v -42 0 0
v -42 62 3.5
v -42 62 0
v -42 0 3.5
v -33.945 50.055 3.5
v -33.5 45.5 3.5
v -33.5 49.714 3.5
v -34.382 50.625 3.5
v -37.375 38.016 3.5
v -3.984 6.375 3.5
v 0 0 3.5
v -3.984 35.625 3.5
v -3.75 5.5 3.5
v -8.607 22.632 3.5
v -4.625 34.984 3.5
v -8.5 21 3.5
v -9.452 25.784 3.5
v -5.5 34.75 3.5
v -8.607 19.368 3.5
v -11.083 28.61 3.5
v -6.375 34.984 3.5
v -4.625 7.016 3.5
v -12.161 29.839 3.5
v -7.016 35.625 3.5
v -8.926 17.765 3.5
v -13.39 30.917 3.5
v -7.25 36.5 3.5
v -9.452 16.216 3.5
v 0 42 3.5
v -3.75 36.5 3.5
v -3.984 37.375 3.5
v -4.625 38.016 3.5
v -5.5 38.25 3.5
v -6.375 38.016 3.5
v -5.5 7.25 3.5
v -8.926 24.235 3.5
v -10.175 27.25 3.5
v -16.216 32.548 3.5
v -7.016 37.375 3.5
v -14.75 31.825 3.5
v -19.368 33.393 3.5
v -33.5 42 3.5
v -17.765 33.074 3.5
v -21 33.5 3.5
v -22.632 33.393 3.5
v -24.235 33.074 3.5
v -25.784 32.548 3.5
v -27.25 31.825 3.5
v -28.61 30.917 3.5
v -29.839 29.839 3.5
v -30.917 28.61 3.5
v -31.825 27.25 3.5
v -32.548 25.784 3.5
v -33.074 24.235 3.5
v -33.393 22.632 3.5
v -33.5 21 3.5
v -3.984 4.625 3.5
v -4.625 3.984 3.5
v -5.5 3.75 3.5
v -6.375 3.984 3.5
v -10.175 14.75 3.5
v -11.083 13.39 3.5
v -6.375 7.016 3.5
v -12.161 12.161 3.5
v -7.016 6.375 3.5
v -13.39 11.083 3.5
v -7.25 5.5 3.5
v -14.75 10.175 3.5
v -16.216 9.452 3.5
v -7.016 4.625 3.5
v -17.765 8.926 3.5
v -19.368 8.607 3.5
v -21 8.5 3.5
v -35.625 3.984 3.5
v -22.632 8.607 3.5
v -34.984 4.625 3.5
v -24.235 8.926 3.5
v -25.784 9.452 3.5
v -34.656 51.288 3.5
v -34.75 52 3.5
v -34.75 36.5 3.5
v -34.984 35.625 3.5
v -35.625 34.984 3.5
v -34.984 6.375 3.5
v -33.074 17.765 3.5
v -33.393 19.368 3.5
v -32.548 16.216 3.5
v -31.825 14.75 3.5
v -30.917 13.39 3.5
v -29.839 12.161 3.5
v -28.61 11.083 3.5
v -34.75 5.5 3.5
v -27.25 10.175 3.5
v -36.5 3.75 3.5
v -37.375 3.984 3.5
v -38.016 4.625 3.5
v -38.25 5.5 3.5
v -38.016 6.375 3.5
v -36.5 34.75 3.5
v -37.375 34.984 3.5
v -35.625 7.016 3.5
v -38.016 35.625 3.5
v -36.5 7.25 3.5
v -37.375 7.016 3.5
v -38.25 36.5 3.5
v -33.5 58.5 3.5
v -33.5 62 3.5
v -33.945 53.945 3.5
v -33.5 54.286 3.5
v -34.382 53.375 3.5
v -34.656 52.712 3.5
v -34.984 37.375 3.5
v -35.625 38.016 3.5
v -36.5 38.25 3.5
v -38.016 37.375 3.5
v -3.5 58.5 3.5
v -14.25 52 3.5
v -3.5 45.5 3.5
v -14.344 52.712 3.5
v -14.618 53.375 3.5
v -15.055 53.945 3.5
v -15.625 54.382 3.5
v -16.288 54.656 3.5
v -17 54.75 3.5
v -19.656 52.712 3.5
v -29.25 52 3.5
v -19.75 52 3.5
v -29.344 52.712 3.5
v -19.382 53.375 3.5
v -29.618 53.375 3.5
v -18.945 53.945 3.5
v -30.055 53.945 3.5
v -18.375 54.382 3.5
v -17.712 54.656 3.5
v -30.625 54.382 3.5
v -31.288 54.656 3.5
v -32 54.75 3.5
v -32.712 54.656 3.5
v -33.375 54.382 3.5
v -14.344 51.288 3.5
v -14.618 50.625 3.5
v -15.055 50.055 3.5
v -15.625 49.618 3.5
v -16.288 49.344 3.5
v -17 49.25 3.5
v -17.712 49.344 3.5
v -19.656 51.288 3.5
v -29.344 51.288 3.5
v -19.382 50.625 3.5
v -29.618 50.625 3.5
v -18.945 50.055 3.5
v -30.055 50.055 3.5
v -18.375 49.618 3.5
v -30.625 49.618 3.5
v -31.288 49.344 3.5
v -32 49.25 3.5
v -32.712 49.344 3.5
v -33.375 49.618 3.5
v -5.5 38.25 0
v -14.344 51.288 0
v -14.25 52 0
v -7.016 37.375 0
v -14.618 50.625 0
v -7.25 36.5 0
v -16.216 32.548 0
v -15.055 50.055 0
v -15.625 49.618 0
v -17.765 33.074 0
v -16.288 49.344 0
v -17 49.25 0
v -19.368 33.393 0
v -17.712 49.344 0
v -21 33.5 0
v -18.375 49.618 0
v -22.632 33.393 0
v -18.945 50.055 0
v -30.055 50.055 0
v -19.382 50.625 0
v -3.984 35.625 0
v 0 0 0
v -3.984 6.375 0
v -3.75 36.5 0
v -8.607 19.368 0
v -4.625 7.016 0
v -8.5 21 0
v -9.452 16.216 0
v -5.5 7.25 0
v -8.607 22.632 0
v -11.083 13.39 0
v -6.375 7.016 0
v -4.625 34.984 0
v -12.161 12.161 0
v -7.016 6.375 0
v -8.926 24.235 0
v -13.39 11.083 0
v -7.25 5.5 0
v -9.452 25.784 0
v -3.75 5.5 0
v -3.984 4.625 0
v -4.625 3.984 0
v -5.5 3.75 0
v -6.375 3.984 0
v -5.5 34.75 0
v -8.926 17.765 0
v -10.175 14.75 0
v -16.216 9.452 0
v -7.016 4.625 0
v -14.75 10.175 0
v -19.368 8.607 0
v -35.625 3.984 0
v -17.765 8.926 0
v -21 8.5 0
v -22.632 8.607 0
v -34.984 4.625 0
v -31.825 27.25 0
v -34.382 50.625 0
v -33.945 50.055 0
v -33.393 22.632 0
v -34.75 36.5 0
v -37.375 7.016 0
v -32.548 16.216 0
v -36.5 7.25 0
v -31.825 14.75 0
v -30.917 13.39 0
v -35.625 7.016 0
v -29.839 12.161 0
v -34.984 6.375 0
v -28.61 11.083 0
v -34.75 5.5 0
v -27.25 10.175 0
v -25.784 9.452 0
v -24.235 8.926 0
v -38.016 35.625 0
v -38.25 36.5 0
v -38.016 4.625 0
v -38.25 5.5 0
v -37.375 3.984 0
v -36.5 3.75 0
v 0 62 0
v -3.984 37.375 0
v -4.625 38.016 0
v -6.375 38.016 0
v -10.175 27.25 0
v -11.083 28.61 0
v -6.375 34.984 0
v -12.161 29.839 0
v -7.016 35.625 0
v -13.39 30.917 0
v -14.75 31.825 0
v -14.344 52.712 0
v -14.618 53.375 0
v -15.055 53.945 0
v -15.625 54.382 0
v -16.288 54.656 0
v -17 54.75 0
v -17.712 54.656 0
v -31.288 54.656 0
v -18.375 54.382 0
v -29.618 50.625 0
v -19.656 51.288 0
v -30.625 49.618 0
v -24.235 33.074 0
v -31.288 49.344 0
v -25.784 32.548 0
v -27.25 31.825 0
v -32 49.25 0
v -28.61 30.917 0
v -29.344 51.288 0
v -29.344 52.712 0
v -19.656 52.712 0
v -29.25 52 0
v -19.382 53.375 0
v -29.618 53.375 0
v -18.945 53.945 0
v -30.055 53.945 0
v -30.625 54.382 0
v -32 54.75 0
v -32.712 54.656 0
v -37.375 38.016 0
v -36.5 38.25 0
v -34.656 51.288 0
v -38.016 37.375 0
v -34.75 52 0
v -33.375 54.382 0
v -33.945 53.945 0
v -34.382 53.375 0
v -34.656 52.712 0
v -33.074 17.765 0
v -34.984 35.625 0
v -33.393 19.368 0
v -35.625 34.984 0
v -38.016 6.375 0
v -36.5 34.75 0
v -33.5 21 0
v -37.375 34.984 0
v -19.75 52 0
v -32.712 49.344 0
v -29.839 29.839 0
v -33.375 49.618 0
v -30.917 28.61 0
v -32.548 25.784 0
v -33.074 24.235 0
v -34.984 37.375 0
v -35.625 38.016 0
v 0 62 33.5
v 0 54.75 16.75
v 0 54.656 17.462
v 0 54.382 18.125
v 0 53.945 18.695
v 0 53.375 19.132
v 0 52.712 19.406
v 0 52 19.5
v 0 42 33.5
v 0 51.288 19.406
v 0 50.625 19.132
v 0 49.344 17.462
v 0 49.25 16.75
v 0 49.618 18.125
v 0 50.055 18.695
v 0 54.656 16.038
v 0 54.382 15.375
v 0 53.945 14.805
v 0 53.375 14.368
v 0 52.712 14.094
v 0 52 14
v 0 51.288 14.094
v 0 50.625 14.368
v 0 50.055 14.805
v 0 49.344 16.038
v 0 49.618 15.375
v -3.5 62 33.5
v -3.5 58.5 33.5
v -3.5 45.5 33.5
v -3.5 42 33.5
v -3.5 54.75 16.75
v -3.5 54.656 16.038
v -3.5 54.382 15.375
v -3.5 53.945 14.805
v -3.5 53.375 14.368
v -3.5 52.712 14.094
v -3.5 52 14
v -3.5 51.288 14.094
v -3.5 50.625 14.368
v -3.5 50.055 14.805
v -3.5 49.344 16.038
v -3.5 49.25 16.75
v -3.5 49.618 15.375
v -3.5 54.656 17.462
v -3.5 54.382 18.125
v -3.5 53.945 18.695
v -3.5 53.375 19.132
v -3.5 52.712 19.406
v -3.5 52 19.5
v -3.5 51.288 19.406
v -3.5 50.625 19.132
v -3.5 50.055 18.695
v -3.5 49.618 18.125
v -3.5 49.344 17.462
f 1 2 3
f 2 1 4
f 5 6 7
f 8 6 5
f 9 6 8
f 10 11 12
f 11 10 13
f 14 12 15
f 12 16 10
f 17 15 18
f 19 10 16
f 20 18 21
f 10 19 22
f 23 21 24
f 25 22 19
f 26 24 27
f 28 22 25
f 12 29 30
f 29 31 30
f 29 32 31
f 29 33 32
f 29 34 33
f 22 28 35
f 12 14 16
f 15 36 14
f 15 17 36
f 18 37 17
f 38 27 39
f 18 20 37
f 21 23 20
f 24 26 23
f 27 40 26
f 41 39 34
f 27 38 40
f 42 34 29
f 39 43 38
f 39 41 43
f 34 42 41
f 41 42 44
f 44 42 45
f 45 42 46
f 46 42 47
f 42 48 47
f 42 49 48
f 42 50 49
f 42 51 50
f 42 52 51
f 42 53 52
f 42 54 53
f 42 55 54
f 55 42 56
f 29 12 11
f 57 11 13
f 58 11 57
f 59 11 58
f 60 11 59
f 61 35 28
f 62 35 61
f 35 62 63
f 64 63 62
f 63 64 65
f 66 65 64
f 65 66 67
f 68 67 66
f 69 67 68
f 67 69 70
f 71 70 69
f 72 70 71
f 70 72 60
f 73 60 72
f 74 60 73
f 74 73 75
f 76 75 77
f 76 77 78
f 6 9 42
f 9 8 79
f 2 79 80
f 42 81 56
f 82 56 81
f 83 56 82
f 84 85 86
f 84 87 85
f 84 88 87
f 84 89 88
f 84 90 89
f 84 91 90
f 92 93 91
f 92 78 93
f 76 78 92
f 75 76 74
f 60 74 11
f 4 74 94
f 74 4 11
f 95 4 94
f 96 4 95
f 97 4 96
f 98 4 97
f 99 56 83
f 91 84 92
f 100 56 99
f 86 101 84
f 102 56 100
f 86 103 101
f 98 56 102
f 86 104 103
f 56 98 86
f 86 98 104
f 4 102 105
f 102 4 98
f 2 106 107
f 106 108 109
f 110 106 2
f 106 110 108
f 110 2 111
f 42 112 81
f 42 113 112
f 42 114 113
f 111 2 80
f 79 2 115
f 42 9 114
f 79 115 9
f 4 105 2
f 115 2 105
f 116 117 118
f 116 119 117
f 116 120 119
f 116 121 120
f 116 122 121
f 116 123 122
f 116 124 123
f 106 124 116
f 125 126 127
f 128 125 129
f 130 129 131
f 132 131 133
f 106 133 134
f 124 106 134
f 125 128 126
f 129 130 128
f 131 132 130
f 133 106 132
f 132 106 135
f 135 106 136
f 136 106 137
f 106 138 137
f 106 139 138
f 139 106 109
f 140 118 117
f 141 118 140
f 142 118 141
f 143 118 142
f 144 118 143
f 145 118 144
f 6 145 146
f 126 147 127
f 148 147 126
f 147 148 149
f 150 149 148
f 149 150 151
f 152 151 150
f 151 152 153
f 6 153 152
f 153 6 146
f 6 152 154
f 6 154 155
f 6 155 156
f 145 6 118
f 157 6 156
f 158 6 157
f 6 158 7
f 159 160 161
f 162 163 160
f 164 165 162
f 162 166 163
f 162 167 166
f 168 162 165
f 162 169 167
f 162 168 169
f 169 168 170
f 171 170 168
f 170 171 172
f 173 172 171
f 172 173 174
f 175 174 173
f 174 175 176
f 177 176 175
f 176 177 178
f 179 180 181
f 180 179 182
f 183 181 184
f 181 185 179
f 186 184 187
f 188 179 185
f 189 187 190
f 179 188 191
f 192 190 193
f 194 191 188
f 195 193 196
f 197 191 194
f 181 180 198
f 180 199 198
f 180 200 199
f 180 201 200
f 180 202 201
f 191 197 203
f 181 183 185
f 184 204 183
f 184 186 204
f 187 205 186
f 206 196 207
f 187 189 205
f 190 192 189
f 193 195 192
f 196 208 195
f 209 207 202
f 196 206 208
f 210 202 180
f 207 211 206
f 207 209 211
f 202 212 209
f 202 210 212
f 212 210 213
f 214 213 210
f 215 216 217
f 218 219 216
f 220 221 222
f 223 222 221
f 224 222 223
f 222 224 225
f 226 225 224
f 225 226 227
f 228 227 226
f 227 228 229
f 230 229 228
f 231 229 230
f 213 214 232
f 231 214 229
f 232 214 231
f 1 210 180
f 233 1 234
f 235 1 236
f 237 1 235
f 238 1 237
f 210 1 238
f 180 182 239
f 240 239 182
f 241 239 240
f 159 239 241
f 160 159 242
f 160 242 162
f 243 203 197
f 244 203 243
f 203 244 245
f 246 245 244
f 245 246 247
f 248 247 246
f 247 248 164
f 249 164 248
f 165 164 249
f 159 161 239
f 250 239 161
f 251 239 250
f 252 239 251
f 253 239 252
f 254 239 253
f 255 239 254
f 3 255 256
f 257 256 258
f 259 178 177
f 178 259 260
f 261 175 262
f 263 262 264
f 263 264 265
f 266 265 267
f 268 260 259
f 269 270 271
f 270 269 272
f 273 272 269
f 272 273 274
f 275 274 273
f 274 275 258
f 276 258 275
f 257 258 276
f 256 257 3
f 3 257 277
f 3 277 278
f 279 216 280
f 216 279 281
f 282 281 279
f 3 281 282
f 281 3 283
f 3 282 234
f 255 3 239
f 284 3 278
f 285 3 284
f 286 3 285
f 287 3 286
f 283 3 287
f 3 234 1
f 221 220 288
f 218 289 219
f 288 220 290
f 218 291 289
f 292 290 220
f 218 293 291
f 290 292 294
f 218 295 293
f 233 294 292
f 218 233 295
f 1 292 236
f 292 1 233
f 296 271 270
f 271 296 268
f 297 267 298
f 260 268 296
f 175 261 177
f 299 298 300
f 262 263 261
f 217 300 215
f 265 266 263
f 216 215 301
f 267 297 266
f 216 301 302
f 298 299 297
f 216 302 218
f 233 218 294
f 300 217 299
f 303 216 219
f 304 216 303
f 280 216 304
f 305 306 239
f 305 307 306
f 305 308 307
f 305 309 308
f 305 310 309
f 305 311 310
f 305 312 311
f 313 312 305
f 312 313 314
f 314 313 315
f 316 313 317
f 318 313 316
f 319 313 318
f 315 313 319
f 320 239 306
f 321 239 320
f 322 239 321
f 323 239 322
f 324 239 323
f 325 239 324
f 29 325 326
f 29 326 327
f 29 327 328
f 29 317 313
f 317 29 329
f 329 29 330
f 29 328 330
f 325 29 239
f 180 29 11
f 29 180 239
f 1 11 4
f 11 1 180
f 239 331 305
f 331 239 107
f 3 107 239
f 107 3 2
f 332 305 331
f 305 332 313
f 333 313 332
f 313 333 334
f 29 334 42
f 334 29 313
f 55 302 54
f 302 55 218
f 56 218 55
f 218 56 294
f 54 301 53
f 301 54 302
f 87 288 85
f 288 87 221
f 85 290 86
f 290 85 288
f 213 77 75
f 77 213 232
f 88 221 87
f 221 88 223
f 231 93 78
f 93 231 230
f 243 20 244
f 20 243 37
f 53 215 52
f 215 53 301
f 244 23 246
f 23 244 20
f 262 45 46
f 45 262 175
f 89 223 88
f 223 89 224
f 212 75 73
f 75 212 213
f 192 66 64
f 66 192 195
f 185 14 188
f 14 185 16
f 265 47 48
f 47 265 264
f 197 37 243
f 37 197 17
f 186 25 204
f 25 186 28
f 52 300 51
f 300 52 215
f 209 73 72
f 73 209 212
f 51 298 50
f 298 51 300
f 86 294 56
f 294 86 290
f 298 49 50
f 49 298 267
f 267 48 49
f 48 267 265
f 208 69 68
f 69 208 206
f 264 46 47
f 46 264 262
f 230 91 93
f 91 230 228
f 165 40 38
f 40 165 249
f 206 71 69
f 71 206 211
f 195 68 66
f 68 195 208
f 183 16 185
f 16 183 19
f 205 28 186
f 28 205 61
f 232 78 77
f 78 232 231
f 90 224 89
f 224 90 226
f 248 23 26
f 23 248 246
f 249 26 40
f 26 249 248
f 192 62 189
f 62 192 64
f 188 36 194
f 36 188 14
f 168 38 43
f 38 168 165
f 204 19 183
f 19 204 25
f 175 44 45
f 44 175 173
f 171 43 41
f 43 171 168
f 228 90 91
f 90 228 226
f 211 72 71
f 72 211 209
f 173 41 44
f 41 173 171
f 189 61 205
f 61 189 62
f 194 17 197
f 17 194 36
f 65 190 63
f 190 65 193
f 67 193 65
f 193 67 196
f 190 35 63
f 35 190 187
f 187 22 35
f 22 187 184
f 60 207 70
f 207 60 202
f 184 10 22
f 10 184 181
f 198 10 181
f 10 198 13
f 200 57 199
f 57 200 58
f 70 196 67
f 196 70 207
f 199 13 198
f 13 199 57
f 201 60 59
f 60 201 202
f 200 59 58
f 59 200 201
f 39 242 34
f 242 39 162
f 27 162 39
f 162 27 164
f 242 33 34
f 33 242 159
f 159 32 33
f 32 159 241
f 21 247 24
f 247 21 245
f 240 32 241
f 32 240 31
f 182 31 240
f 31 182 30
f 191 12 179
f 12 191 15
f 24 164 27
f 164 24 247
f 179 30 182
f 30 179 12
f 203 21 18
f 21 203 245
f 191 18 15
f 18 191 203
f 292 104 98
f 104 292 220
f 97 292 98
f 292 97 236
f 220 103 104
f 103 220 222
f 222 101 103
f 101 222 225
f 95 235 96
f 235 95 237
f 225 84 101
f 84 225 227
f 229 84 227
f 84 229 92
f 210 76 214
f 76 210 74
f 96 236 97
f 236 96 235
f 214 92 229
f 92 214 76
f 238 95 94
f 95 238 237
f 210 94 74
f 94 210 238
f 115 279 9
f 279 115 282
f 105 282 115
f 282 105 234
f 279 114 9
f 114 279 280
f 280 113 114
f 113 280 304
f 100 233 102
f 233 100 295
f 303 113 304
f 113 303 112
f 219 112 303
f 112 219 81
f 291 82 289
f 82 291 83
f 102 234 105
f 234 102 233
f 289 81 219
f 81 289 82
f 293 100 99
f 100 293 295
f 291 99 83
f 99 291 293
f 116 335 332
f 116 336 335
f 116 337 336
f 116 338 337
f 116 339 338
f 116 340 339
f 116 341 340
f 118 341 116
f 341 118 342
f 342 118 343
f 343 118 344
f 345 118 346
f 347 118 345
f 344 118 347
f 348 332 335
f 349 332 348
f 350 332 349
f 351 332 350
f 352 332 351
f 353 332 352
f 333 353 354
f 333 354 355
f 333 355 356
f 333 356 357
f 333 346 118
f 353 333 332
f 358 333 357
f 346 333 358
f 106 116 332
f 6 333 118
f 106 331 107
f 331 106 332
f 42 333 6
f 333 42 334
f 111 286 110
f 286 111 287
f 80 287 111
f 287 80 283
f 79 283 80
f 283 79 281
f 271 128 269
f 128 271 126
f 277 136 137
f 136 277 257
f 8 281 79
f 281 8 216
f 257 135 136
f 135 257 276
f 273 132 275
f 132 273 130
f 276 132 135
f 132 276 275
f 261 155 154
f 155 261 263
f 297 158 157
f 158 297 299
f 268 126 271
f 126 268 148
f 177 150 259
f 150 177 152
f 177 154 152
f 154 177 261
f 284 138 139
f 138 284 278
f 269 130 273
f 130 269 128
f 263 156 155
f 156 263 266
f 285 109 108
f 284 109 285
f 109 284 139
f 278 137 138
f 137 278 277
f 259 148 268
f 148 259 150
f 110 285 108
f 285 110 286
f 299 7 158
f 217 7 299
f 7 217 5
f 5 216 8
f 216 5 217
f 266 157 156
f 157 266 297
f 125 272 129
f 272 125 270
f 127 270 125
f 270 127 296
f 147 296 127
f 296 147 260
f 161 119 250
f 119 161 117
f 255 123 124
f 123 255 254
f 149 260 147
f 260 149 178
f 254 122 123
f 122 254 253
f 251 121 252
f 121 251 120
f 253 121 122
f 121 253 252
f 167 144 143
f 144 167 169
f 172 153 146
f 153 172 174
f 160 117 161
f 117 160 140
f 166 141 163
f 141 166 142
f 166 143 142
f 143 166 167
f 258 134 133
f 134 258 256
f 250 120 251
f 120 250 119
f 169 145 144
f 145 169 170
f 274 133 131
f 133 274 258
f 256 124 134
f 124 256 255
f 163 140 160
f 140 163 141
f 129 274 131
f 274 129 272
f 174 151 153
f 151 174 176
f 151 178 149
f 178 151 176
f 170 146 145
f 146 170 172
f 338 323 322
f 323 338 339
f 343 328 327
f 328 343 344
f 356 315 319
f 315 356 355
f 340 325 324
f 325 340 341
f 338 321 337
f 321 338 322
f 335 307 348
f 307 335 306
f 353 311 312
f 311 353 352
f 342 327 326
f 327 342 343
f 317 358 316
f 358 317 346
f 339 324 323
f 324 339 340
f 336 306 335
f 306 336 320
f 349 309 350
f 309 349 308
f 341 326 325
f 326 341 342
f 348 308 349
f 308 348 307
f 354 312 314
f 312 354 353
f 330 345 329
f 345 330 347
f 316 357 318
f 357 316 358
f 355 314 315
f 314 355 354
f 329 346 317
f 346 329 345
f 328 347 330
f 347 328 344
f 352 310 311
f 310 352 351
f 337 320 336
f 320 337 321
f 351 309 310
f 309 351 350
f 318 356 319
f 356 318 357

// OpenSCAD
t=3.5;
mirror([1,0,0])
difference()
{
    union()
    {
        cube([42,42,t]);
        
        //translate([-20,0,0])
        //    cube([20,42,t]);
        translate([0,42,0])
            cube([42,20,t]);
        
        //translate([-20,0,t])
        //    cube([20,42,40]);
        translate([0,42,t])
            cube([33.5,20,30]);
    }
    
    union()
    {
        translate([21,21,0])
            cylinder(d=25,h=t,$fn=48);
        
        translate([21-31/2,21-31/2,0])
            cylinder(d=3.5,h=t,$fn=12);
        translate([21-31/2,21+31/2,0])
            cylinder(d=3.5,h=t,$fn=12);
        translate([21+31/2,21-31/2,0])
            cylinder(d=3.5,h=t,$fn=12);
        translate([21+31/2,21+31/2,0])
            cylinder(d=3.5,h=t,$fn=12);
        
        translate([-20+t,0,t])
            cube([20-t*2,42-t,40]);
        translate([0+t,42+t,t])
            cube([33.5-t,20-t*2,30]);
        
        translate([-20,0,t+t-2])
            rotate([45,0,0])
                cube([20,42*sqrt(2),42*sqrt(2)]);
        translate([30+3.5,42,t+t-3.5])
            rotate([0,45+270,0])
                cube([33*sqrt(2),20,33*sqrt(2)]);
        
        translate([-10,10,0])
            cylinder(d=5.5,h=t,$fn=24);
        translate([-10,25,0])
            cylinder(d=5.5,h=t,$fn=24);
            
        translate([-10,42-t,20+14])
            rotate([270,0,0])
                cylinder(d=5.5,h=t,$fn=24);
        translate([-10,42-t,20-11])
            rotate([270,0,0])
                cylinder(d=5.5,h=t,$fn=24);
                
        translate([-10,42-t,20])
            rotate([270,0,0])
                cylinder(d=8,h=t,$fn=24);
        
        translate([42-10,42+10,0])
            cylinder(d=5.5,h=t,$fn=24);
        translate([42-25,42+10,0])
            cylinder(d=5.5,h=t,$fn=24);
            
        translate([0,42+10,t+(30-t)/2])
            rotate([0,90,0])
                cylinder(d=5.5,h=t+1,$fn=24);
    }
}
